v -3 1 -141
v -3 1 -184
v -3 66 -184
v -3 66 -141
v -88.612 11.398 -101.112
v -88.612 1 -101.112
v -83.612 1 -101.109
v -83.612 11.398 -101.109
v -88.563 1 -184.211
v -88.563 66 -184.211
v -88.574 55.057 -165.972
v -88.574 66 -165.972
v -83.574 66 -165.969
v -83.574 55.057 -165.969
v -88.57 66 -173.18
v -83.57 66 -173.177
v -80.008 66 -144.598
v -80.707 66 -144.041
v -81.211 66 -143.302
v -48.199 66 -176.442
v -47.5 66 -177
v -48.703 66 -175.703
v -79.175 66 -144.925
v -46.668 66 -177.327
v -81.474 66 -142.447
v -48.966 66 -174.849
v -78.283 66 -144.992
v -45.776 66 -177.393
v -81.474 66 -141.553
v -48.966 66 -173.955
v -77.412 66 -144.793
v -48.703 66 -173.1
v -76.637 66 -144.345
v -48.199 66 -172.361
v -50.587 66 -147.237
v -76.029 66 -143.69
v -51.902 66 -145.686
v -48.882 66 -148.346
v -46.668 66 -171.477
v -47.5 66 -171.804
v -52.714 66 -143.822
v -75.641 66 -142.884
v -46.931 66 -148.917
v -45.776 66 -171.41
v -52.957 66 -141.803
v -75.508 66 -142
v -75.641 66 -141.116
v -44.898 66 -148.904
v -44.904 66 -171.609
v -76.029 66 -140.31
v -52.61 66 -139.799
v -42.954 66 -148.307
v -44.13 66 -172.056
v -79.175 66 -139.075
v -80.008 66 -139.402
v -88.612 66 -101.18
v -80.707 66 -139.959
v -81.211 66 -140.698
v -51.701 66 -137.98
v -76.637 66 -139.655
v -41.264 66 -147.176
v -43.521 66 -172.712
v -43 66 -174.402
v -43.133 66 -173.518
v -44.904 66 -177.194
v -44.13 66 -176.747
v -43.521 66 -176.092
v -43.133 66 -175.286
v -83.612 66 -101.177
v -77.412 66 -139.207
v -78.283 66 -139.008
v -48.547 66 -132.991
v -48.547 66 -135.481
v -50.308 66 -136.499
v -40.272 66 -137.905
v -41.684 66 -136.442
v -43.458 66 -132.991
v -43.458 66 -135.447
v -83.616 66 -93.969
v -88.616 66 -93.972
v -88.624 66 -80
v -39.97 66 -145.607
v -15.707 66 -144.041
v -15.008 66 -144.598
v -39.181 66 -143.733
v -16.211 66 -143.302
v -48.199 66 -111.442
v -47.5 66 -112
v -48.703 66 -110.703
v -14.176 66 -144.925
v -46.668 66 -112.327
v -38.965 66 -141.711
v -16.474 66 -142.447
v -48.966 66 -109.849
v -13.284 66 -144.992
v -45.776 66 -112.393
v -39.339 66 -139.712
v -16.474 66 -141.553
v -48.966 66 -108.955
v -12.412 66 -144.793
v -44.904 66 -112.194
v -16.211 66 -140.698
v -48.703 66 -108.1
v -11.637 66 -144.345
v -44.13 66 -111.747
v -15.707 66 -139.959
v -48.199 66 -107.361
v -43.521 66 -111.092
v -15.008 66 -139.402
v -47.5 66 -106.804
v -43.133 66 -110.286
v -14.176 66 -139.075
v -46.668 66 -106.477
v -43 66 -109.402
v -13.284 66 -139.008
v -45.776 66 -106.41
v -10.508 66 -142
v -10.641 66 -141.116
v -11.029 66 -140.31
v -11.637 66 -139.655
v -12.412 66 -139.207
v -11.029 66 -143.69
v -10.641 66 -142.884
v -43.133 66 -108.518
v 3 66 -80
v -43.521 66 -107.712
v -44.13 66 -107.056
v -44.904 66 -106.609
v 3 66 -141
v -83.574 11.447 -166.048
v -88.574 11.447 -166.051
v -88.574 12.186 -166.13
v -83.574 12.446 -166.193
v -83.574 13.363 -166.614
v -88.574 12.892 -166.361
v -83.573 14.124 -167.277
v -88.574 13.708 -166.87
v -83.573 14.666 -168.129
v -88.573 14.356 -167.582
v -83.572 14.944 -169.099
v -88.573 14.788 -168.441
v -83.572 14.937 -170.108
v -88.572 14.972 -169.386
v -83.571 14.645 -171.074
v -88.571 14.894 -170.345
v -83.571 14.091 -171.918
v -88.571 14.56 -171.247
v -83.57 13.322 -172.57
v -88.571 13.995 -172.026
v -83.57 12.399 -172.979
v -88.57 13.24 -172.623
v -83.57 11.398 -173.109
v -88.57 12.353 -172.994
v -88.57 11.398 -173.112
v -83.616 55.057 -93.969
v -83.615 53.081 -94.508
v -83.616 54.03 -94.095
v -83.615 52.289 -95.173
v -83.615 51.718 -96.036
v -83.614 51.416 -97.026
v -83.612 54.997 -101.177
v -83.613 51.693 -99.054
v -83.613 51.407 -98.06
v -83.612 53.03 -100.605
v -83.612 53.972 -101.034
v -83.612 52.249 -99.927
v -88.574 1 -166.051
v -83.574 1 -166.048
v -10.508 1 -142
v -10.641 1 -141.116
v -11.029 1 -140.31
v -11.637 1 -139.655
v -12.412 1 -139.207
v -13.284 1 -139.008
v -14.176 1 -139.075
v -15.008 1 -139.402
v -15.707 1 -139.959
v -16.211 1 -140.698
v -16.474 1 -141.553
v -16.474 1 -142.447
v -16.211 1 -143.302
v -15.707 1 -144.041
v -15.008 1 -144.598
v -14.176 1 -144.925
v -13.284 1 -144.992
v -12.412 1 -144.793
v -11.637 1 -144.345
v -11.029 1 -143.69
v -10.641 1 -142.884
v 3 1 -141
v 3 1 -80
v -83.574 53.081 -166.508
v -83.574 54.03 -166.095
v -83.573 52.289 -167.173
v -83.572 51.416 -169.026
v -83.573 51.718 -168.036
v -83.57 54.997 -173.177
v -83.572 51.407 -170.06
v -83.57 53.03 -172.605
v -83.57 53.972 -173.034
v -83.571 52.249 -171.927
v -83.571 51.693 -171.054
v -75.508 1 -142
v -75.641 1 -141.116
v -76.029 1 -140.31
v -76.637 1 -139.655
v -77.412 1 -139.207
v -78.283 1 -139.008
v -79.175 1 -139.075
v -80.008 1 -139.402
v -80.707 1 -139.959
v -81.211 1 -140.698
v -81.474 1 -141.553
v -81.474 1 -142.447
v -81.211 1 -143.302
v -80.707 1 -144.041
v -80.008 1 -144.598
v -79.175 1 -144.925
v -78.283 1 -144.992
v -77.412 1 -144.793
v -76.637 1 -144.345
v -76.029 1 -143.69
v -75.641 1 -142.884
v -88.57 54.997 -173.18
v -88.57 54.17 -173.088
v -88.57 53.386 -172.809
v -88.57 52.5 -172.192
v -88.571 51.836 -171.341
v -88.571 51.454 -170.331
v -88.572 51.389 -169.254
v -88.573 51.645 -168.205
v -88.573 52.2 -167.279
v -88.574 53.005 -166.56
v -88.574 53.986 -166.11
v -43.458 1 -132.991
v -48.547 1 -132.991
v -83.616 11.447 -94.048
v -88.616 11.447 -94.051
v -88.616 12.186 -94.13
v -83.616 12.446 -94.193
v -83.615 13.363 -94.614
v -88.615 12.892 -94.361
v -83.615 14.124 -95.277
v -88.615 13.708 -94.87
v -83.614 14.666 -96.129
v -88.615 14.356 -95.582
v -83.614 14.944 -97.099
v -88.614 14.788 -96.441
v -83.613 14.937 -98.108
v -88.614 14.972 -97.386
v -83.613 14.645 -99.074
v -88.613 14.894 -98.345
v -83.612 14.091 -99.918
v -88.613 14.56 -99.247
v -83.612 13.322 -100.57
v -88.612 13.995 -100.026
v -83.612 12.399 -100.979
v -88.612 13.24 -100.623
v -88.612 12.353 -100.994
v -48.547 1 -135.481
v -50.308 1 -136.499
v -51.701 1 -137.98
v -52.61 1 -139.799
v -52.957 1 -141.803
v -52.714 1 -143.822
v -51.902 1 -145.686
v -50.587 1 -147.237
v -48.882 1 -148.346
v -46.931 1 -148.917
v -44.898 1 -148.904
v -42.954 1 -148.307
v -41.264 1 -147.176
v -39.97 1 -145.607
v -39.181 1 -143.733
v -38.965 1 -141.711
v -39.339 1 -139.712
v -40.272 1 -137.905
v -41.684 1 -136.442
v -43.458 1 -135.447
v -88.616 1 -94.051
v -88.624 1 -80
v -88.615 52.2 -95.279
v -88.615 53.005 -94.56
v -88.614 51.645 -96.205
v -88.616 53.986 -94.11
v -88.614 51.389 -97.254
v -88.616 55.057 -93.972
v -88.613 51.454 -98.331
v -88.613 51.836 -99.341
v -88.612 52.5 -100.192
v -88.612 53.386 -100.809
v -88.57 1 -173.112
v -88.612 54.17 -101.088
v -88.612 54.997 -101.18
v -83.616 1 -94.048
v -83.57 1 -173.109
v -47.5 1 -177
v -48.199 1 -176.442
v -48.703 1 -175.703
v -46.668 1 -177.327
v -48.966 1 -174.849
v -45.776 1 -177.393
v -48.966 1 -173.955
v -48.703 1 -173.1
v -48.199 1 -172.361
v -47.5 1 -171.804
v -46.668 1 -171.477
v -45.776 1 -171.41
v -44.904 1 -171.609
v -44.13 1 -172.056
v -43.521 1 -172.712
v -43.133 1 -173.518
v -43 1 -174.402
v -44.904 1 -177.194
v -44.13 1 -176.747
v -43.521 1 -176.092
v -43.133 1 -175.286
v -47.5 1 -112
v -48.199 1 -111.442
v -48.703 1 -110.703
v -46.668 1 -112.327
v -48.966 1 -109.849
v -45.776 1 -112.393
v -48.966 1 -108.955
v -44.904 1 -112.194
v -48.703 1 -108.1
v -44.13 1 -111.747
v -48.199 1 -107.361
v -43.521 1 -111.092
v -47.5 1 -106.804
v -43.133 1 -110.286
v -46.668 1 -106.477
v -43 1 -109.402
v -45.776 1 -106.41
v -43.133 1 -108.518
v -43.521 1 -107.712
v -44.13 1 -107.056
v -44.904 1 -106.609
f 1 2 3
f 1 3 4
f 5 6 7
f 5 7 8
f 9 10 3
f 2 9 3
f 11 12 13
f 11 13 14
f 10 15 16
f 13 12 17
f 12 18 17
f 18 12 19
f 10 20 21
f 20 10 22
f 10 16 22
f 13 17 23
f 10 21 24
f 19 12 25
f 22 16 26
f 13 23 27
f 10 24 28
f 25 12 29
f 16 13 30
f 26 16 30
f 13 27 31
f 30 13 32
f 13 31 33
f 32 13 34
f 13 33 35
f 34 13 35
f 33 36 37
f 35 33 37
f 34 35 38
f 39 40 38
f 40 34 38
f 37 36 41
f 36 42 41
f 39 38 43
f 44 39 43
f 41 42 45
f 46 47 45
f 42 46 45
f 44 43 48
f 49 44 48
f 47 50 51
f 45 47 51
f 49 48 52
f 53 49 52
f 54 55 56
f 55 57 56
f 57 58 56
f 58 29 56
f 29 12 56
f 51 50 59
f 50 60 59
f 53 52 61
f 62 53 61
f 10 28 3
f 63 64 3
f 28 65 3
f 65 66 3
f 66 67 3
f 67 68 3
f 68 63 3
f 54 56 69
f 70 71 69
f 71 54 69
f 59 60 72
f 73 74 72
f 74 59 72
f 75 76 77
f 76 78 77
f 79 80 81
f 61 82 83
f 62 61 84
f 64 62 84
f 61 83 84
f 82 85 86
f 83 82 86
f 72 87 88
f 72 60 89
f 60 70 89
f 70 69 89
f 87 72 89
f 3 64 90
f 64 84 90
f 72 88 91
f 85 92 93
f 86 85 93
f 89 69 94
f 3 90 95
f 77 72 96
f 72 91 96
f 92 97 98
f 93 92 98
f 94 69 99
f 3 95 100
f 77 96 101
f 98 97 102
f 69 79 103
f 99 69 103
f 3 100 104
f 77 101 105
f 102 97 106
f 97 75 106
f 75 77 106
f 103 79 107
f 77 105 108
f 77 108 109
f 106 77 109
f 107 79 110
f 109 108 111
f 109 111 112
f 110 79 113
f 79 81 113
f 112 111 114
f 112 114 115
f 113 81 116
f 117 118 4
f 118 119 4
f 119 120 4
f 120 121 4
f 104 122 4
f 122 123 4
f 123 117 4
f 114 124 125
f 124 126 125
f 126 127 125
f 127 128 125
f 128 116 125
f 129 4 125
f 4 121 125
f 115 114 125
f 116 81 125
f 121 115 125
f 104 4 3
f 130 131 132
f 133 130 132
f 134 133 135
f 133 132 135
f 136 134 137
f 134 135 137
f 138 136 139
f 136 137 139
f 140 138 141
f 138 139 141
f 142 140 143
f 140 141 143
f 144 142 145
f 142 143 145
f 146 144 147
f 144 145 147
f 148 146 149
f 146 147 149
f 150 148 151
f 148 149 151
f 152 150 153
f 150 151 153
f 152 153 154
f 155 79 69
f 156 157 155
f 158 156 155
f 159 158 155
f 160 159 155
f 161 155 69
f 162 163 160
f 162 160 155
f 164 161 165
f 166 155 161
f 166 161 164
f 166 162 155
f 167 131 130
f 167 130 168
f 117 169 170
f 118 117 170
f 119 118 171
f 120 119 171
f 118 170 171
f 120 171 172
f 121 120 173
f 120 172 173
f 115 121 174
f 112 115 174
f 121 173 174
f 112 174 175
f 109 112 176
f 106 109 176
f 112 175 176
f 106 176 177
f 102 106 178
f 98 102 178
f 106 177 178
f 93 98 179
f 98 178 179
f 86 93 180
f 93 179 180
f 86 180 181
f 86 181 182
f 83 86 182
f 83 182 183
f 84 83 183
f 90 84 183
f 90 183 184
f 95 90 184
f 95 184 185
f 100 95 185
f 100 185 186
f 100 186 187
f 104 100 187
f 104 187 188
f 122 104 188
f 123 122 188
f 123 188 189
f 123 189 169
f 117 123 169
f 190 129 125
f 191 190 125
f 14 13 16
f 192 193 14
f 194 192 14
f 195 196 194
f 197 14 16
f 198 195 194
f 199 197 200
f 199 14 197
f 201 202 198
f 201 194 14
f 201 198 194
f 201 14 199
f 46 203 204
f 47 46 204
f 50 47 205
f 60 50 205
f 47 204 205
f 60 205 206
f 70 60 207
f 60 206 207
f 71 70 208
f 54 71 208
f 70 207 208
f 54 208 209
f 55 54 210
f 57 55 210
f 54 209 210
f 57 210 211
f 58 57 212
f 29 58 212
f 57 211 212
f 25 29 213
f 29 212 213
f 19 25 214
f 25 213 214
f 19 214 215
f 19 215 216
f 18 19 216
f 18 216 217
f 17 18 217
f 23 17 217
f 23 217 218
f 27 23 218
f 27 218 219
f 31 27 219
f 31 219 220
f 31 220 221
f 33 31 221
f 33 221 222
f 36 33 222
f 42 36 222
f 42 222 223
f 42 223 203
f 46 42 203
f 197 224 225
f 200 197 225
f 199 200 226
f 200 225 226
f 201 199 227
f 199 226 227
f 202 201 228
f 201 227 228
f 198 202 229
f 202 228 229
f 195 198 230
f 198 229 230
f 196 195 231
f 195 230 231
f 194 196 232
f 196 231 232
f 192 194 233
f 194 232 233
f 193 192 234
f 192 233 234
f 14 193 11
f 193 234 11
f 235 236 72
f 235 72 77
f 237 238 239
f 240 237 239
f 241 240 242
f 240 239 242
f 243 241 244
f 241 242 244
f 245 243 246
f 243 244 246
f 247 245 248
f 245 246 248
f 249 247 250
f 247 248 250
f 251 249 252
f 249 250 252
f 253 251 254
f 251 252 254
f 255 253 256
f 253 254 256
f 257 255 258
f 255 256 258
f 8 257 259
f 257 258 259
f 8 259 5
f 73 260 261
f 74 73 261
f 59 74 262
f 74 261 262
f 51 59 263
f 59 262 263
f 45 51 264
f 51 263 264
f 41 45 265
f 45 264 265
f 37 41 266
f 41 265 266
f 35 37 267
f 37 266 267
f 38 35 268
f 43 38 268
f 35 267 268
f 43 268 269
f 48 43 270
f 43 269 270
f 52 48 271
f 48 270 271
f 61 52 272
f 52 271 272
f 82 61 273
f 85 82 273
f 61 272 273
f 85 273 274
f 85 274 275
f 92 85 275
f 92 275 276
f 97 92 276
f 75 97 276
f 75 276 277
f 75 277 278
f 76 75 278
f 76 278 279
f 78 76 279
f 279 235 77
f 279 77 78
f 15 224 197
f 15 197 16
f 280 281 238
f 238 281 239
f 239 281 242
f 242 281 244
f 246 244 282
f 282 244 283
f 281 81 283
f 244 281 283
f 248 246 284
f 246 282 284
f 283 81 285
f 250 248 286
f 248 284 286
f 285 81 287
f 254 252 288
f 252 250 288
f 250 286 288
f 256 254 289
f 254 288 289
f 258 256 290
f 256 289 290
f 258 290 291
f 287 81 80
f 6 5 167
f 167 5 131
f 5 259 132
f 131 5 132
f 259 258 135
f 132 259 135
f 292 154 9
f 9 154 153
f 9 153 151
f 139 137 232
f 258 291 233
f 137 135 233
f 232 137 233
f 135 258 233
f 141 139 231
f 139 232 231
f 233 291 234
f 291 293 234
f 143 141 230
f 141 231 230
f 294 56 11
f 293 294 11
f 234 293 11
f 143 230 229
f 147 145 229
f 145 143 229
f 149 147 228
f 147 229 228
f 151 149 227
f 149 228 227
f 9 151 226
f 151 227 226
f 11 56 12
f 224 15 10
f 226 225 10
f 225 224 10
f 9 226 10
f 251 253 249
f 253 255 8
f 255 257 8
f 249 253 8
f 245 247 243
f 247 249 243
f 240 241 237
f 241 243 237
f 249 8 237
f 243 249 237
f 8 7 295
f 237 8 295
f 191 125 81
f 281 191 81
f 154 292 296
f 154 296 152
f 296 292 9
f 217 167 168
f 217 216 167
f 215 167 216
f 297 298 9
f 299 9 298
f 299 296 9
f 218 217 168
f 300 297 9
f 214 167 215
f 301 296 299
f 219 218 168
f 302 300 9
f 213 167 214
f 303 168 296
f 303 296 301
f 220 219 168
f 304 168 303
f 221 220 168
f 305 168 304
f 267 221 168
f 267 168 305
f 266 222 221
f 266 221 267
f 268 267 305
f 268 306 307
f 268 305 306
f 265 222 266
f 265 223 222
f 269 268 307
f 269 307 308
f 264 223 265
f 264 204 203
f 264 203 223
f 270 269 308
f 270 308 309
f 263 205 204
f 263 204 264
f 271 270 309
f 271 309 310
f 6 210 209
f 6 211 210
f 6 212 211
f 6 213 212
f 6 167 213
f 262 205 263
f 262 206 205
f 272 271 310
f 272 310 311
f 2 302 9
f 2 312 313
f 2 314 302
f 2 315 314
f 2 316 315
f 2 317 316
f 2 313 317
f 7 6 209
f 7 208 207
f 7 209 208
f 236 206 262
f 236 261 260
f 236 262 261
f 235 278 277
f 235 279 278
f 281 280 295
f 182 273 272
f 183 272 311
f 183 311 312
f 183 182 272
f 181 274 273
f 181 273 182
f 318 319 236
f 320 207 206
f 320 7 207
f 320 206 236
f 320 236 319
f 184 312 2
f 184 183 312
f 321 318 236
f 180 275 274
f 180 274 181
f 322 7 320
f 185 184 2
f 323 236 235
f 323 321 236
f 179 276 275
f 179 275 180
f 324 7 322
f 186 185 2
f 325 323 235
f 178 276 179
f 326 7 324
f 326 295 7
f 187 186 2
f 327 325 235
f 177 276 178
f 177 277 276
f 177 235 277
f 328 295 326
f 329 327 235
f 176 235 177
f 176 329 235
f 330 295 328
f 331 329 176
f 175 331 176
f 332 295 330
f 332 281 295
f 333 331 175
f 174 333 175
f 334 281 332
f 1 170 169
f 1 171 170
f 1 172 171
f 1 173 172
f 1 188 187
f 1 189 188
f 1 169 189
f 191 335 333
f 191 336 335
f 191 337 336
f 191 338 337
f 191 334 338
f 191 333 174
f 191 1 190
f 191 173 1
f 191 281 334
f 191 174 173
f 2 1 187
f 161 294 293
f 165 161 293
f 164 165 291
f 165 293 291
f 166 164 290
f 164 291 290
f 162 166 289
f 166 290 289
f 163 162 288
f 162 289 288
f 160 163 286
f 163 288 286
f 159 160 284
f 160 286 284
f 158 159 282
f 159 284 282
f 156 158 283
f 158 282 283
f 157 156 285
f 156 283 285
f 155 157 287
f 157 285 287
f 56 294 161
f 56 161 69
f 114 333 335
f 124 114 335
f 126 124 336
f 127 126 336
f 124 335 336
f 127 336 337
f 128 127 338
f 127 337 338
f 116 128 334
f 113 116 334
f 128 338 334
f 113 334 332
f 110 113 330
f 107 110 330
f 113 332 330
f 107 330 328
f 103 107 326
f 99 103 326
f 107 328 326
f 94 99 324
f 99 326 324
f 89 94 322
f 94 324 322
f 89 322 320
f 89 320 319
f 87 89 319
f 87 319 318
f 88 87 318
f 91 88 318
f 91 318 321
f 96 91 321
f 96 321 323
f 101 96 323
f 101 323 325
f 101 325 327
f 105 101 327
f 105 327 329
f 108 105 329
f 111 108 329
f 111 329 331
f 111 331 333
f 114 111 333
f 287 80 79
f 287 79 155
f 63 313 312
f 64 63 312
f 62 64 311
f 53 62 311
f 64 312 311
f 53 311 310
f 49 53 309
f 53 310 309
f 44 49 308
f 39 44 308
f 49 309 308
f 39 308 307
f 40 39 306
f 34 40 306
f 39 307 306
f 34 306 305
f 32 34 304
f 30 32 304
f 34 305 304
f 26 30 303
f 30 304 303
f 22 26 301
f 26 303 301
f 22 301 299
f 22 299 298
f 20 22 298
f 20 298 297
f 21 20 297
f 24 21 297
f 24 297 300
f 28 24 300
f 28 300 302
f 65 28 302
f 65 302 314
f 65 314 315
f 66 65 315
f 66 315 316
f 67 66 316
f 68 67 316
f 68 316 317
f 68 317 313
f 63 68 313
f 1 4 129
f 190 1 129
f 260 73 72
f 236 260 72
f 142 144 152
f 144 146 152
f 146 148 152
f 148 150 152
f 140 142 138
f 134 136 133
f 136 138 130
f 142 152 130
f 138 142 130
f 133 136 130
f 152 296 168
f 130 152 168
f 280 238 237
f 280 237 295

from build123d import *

# Parameters (mm, degrees)
PAD002_DEPTH           = 65
SKETCH004_R            = 3
HOLE001_DEPTH          = 72
POCKET_DEPTH           = 72
POCKET001_DEPTH        = 5
LINEARPATTERN_COUNT    = 2
LINEARPATTERN_PITCH    = 72
POCKET002_DEPTH        = 5
LINEARPATTERN001_COUNT = 2
LINEARPATTERN001_PITCH = 72


with BuildPart() as part:
    # Sketch003 → Pad002 (new body)
    with BuildSketch(Plane.XZ):
        Polygon((3, -80), (-88.623817, -80), (-88.563461, -184.210968), (-3, -184), (-3, -141), (3, -141), align=None)
    extrude(amount=PAD002_DEPTH)

    # Sketch004 (on Face8 of Pad002) → Hole001 (cut)
    with BuildSketch(Plane.XZ.offset(65)):
        with Locations((-46, -109.40177)):
            Circle(SKETCH004_R)
        with Locations((-13.507946, -142)):
            Circle(SKETCH004_R)
        with Locations((-45.999997, -174.401768)):
            Circle(SKETCH004_R)
        with Locations((-78.507649, -142)):
            Circle(SKETCH004_R)
    extrude(amount=-HOLE001_DEPTH, mode=Mode.SUBTRACT)

    # Sketch005 (on Face5 of Hole001) → Pocket (cut)
    with BuildSketch(Plane.XZ.offset(65)):
        with BuildLine():
            ThreePointArc((-48.547432, -135.480744), (-45.913728, -148.984728), (-43.457714, -135.447299))
            Line((-43.457714, -132.991287), (-43.457714, -135.447299))
            Line((-48.547432, -132.991287), (-43.457714, -132.991287))
            Line((-48.547432, -135.480744), (-48.547432, -132.991287))
        make_face()
    extrude(amount=-POCKET_DEPTH, mode=Mode.SUBTRACT)

    # Sketch007 (on Face3 of Pocket) → Pocket001 (cut)
    with BuildSketch(Plane(origin=(-88.670121, 0, -0.051355), x_dir=(0.000579, 0, -1), z_dir=(-1, 0, -0.000579))):
        with BuildLine():
            Line((94, 65.961746), (101.060434, 65.961746))
            Line((101.060434, 65.961746), (101.060434, 54.602297))
            ThreePointArc((94, 54.553143), (97.554966, 51.02284), (101.060434, 54.602297))
            Line((94, 54.553143), (94, 65.961746))
        make_face()
    pocket001 = extrude(amount=-POCKET001_DEPTH, mode=Mode.SUBTRACT)

    # LinearPattern: Pocket001 ×2
    with Locations(*[Vector(0.000579, 0, -1) * (i * LINEARPATTERN_PITCH) for i in range(1, LINEARPATTERN_COUNT)]):
        add(pocket001, mode=Mode.SUBTRACT)

    # Sketch008 (on Face3 of LinearPattern) → Pocket002 (cut)
    with BuildSketch(Plane(origin=(-88.670121, 0, -0.051355), x_dir=(0.000579, 0, -1), z_dir=(-1, 0, -0.000579))):
        with BuildLine():
            ThreePointArc((101.128495, 11.00325), (97.494061, 14.625529), (93.920682, 10.943006))
            Line((93.920682, -1.640862), (93.920682, 10.943006))
            Line((101.128495, -1.640862), (93.920682, -1.640862))
            Line((101.128495, 11.00325), (101.128495, -1.640862))
        make_face()
    pocket002 = extrude(amount=-POCKET002_DEPTH, mode=Mode.SUBTRACT)

    # LinearPattern001: Pocket002 ×2
    with Locations(*[Vector(0.000579, 0, -1) * (i * LINEARPATTERN001_PITCH) for i in range(1, LINEARPATTERN001_COUNT)]):
        add(pocket002, mode=Mode.SUBTRACT)


with BuildPart() as part_1:
    # Body002 placement: moved
    add(part.part.moved(Location((0, 66, 0))))


solid = part_1.part
